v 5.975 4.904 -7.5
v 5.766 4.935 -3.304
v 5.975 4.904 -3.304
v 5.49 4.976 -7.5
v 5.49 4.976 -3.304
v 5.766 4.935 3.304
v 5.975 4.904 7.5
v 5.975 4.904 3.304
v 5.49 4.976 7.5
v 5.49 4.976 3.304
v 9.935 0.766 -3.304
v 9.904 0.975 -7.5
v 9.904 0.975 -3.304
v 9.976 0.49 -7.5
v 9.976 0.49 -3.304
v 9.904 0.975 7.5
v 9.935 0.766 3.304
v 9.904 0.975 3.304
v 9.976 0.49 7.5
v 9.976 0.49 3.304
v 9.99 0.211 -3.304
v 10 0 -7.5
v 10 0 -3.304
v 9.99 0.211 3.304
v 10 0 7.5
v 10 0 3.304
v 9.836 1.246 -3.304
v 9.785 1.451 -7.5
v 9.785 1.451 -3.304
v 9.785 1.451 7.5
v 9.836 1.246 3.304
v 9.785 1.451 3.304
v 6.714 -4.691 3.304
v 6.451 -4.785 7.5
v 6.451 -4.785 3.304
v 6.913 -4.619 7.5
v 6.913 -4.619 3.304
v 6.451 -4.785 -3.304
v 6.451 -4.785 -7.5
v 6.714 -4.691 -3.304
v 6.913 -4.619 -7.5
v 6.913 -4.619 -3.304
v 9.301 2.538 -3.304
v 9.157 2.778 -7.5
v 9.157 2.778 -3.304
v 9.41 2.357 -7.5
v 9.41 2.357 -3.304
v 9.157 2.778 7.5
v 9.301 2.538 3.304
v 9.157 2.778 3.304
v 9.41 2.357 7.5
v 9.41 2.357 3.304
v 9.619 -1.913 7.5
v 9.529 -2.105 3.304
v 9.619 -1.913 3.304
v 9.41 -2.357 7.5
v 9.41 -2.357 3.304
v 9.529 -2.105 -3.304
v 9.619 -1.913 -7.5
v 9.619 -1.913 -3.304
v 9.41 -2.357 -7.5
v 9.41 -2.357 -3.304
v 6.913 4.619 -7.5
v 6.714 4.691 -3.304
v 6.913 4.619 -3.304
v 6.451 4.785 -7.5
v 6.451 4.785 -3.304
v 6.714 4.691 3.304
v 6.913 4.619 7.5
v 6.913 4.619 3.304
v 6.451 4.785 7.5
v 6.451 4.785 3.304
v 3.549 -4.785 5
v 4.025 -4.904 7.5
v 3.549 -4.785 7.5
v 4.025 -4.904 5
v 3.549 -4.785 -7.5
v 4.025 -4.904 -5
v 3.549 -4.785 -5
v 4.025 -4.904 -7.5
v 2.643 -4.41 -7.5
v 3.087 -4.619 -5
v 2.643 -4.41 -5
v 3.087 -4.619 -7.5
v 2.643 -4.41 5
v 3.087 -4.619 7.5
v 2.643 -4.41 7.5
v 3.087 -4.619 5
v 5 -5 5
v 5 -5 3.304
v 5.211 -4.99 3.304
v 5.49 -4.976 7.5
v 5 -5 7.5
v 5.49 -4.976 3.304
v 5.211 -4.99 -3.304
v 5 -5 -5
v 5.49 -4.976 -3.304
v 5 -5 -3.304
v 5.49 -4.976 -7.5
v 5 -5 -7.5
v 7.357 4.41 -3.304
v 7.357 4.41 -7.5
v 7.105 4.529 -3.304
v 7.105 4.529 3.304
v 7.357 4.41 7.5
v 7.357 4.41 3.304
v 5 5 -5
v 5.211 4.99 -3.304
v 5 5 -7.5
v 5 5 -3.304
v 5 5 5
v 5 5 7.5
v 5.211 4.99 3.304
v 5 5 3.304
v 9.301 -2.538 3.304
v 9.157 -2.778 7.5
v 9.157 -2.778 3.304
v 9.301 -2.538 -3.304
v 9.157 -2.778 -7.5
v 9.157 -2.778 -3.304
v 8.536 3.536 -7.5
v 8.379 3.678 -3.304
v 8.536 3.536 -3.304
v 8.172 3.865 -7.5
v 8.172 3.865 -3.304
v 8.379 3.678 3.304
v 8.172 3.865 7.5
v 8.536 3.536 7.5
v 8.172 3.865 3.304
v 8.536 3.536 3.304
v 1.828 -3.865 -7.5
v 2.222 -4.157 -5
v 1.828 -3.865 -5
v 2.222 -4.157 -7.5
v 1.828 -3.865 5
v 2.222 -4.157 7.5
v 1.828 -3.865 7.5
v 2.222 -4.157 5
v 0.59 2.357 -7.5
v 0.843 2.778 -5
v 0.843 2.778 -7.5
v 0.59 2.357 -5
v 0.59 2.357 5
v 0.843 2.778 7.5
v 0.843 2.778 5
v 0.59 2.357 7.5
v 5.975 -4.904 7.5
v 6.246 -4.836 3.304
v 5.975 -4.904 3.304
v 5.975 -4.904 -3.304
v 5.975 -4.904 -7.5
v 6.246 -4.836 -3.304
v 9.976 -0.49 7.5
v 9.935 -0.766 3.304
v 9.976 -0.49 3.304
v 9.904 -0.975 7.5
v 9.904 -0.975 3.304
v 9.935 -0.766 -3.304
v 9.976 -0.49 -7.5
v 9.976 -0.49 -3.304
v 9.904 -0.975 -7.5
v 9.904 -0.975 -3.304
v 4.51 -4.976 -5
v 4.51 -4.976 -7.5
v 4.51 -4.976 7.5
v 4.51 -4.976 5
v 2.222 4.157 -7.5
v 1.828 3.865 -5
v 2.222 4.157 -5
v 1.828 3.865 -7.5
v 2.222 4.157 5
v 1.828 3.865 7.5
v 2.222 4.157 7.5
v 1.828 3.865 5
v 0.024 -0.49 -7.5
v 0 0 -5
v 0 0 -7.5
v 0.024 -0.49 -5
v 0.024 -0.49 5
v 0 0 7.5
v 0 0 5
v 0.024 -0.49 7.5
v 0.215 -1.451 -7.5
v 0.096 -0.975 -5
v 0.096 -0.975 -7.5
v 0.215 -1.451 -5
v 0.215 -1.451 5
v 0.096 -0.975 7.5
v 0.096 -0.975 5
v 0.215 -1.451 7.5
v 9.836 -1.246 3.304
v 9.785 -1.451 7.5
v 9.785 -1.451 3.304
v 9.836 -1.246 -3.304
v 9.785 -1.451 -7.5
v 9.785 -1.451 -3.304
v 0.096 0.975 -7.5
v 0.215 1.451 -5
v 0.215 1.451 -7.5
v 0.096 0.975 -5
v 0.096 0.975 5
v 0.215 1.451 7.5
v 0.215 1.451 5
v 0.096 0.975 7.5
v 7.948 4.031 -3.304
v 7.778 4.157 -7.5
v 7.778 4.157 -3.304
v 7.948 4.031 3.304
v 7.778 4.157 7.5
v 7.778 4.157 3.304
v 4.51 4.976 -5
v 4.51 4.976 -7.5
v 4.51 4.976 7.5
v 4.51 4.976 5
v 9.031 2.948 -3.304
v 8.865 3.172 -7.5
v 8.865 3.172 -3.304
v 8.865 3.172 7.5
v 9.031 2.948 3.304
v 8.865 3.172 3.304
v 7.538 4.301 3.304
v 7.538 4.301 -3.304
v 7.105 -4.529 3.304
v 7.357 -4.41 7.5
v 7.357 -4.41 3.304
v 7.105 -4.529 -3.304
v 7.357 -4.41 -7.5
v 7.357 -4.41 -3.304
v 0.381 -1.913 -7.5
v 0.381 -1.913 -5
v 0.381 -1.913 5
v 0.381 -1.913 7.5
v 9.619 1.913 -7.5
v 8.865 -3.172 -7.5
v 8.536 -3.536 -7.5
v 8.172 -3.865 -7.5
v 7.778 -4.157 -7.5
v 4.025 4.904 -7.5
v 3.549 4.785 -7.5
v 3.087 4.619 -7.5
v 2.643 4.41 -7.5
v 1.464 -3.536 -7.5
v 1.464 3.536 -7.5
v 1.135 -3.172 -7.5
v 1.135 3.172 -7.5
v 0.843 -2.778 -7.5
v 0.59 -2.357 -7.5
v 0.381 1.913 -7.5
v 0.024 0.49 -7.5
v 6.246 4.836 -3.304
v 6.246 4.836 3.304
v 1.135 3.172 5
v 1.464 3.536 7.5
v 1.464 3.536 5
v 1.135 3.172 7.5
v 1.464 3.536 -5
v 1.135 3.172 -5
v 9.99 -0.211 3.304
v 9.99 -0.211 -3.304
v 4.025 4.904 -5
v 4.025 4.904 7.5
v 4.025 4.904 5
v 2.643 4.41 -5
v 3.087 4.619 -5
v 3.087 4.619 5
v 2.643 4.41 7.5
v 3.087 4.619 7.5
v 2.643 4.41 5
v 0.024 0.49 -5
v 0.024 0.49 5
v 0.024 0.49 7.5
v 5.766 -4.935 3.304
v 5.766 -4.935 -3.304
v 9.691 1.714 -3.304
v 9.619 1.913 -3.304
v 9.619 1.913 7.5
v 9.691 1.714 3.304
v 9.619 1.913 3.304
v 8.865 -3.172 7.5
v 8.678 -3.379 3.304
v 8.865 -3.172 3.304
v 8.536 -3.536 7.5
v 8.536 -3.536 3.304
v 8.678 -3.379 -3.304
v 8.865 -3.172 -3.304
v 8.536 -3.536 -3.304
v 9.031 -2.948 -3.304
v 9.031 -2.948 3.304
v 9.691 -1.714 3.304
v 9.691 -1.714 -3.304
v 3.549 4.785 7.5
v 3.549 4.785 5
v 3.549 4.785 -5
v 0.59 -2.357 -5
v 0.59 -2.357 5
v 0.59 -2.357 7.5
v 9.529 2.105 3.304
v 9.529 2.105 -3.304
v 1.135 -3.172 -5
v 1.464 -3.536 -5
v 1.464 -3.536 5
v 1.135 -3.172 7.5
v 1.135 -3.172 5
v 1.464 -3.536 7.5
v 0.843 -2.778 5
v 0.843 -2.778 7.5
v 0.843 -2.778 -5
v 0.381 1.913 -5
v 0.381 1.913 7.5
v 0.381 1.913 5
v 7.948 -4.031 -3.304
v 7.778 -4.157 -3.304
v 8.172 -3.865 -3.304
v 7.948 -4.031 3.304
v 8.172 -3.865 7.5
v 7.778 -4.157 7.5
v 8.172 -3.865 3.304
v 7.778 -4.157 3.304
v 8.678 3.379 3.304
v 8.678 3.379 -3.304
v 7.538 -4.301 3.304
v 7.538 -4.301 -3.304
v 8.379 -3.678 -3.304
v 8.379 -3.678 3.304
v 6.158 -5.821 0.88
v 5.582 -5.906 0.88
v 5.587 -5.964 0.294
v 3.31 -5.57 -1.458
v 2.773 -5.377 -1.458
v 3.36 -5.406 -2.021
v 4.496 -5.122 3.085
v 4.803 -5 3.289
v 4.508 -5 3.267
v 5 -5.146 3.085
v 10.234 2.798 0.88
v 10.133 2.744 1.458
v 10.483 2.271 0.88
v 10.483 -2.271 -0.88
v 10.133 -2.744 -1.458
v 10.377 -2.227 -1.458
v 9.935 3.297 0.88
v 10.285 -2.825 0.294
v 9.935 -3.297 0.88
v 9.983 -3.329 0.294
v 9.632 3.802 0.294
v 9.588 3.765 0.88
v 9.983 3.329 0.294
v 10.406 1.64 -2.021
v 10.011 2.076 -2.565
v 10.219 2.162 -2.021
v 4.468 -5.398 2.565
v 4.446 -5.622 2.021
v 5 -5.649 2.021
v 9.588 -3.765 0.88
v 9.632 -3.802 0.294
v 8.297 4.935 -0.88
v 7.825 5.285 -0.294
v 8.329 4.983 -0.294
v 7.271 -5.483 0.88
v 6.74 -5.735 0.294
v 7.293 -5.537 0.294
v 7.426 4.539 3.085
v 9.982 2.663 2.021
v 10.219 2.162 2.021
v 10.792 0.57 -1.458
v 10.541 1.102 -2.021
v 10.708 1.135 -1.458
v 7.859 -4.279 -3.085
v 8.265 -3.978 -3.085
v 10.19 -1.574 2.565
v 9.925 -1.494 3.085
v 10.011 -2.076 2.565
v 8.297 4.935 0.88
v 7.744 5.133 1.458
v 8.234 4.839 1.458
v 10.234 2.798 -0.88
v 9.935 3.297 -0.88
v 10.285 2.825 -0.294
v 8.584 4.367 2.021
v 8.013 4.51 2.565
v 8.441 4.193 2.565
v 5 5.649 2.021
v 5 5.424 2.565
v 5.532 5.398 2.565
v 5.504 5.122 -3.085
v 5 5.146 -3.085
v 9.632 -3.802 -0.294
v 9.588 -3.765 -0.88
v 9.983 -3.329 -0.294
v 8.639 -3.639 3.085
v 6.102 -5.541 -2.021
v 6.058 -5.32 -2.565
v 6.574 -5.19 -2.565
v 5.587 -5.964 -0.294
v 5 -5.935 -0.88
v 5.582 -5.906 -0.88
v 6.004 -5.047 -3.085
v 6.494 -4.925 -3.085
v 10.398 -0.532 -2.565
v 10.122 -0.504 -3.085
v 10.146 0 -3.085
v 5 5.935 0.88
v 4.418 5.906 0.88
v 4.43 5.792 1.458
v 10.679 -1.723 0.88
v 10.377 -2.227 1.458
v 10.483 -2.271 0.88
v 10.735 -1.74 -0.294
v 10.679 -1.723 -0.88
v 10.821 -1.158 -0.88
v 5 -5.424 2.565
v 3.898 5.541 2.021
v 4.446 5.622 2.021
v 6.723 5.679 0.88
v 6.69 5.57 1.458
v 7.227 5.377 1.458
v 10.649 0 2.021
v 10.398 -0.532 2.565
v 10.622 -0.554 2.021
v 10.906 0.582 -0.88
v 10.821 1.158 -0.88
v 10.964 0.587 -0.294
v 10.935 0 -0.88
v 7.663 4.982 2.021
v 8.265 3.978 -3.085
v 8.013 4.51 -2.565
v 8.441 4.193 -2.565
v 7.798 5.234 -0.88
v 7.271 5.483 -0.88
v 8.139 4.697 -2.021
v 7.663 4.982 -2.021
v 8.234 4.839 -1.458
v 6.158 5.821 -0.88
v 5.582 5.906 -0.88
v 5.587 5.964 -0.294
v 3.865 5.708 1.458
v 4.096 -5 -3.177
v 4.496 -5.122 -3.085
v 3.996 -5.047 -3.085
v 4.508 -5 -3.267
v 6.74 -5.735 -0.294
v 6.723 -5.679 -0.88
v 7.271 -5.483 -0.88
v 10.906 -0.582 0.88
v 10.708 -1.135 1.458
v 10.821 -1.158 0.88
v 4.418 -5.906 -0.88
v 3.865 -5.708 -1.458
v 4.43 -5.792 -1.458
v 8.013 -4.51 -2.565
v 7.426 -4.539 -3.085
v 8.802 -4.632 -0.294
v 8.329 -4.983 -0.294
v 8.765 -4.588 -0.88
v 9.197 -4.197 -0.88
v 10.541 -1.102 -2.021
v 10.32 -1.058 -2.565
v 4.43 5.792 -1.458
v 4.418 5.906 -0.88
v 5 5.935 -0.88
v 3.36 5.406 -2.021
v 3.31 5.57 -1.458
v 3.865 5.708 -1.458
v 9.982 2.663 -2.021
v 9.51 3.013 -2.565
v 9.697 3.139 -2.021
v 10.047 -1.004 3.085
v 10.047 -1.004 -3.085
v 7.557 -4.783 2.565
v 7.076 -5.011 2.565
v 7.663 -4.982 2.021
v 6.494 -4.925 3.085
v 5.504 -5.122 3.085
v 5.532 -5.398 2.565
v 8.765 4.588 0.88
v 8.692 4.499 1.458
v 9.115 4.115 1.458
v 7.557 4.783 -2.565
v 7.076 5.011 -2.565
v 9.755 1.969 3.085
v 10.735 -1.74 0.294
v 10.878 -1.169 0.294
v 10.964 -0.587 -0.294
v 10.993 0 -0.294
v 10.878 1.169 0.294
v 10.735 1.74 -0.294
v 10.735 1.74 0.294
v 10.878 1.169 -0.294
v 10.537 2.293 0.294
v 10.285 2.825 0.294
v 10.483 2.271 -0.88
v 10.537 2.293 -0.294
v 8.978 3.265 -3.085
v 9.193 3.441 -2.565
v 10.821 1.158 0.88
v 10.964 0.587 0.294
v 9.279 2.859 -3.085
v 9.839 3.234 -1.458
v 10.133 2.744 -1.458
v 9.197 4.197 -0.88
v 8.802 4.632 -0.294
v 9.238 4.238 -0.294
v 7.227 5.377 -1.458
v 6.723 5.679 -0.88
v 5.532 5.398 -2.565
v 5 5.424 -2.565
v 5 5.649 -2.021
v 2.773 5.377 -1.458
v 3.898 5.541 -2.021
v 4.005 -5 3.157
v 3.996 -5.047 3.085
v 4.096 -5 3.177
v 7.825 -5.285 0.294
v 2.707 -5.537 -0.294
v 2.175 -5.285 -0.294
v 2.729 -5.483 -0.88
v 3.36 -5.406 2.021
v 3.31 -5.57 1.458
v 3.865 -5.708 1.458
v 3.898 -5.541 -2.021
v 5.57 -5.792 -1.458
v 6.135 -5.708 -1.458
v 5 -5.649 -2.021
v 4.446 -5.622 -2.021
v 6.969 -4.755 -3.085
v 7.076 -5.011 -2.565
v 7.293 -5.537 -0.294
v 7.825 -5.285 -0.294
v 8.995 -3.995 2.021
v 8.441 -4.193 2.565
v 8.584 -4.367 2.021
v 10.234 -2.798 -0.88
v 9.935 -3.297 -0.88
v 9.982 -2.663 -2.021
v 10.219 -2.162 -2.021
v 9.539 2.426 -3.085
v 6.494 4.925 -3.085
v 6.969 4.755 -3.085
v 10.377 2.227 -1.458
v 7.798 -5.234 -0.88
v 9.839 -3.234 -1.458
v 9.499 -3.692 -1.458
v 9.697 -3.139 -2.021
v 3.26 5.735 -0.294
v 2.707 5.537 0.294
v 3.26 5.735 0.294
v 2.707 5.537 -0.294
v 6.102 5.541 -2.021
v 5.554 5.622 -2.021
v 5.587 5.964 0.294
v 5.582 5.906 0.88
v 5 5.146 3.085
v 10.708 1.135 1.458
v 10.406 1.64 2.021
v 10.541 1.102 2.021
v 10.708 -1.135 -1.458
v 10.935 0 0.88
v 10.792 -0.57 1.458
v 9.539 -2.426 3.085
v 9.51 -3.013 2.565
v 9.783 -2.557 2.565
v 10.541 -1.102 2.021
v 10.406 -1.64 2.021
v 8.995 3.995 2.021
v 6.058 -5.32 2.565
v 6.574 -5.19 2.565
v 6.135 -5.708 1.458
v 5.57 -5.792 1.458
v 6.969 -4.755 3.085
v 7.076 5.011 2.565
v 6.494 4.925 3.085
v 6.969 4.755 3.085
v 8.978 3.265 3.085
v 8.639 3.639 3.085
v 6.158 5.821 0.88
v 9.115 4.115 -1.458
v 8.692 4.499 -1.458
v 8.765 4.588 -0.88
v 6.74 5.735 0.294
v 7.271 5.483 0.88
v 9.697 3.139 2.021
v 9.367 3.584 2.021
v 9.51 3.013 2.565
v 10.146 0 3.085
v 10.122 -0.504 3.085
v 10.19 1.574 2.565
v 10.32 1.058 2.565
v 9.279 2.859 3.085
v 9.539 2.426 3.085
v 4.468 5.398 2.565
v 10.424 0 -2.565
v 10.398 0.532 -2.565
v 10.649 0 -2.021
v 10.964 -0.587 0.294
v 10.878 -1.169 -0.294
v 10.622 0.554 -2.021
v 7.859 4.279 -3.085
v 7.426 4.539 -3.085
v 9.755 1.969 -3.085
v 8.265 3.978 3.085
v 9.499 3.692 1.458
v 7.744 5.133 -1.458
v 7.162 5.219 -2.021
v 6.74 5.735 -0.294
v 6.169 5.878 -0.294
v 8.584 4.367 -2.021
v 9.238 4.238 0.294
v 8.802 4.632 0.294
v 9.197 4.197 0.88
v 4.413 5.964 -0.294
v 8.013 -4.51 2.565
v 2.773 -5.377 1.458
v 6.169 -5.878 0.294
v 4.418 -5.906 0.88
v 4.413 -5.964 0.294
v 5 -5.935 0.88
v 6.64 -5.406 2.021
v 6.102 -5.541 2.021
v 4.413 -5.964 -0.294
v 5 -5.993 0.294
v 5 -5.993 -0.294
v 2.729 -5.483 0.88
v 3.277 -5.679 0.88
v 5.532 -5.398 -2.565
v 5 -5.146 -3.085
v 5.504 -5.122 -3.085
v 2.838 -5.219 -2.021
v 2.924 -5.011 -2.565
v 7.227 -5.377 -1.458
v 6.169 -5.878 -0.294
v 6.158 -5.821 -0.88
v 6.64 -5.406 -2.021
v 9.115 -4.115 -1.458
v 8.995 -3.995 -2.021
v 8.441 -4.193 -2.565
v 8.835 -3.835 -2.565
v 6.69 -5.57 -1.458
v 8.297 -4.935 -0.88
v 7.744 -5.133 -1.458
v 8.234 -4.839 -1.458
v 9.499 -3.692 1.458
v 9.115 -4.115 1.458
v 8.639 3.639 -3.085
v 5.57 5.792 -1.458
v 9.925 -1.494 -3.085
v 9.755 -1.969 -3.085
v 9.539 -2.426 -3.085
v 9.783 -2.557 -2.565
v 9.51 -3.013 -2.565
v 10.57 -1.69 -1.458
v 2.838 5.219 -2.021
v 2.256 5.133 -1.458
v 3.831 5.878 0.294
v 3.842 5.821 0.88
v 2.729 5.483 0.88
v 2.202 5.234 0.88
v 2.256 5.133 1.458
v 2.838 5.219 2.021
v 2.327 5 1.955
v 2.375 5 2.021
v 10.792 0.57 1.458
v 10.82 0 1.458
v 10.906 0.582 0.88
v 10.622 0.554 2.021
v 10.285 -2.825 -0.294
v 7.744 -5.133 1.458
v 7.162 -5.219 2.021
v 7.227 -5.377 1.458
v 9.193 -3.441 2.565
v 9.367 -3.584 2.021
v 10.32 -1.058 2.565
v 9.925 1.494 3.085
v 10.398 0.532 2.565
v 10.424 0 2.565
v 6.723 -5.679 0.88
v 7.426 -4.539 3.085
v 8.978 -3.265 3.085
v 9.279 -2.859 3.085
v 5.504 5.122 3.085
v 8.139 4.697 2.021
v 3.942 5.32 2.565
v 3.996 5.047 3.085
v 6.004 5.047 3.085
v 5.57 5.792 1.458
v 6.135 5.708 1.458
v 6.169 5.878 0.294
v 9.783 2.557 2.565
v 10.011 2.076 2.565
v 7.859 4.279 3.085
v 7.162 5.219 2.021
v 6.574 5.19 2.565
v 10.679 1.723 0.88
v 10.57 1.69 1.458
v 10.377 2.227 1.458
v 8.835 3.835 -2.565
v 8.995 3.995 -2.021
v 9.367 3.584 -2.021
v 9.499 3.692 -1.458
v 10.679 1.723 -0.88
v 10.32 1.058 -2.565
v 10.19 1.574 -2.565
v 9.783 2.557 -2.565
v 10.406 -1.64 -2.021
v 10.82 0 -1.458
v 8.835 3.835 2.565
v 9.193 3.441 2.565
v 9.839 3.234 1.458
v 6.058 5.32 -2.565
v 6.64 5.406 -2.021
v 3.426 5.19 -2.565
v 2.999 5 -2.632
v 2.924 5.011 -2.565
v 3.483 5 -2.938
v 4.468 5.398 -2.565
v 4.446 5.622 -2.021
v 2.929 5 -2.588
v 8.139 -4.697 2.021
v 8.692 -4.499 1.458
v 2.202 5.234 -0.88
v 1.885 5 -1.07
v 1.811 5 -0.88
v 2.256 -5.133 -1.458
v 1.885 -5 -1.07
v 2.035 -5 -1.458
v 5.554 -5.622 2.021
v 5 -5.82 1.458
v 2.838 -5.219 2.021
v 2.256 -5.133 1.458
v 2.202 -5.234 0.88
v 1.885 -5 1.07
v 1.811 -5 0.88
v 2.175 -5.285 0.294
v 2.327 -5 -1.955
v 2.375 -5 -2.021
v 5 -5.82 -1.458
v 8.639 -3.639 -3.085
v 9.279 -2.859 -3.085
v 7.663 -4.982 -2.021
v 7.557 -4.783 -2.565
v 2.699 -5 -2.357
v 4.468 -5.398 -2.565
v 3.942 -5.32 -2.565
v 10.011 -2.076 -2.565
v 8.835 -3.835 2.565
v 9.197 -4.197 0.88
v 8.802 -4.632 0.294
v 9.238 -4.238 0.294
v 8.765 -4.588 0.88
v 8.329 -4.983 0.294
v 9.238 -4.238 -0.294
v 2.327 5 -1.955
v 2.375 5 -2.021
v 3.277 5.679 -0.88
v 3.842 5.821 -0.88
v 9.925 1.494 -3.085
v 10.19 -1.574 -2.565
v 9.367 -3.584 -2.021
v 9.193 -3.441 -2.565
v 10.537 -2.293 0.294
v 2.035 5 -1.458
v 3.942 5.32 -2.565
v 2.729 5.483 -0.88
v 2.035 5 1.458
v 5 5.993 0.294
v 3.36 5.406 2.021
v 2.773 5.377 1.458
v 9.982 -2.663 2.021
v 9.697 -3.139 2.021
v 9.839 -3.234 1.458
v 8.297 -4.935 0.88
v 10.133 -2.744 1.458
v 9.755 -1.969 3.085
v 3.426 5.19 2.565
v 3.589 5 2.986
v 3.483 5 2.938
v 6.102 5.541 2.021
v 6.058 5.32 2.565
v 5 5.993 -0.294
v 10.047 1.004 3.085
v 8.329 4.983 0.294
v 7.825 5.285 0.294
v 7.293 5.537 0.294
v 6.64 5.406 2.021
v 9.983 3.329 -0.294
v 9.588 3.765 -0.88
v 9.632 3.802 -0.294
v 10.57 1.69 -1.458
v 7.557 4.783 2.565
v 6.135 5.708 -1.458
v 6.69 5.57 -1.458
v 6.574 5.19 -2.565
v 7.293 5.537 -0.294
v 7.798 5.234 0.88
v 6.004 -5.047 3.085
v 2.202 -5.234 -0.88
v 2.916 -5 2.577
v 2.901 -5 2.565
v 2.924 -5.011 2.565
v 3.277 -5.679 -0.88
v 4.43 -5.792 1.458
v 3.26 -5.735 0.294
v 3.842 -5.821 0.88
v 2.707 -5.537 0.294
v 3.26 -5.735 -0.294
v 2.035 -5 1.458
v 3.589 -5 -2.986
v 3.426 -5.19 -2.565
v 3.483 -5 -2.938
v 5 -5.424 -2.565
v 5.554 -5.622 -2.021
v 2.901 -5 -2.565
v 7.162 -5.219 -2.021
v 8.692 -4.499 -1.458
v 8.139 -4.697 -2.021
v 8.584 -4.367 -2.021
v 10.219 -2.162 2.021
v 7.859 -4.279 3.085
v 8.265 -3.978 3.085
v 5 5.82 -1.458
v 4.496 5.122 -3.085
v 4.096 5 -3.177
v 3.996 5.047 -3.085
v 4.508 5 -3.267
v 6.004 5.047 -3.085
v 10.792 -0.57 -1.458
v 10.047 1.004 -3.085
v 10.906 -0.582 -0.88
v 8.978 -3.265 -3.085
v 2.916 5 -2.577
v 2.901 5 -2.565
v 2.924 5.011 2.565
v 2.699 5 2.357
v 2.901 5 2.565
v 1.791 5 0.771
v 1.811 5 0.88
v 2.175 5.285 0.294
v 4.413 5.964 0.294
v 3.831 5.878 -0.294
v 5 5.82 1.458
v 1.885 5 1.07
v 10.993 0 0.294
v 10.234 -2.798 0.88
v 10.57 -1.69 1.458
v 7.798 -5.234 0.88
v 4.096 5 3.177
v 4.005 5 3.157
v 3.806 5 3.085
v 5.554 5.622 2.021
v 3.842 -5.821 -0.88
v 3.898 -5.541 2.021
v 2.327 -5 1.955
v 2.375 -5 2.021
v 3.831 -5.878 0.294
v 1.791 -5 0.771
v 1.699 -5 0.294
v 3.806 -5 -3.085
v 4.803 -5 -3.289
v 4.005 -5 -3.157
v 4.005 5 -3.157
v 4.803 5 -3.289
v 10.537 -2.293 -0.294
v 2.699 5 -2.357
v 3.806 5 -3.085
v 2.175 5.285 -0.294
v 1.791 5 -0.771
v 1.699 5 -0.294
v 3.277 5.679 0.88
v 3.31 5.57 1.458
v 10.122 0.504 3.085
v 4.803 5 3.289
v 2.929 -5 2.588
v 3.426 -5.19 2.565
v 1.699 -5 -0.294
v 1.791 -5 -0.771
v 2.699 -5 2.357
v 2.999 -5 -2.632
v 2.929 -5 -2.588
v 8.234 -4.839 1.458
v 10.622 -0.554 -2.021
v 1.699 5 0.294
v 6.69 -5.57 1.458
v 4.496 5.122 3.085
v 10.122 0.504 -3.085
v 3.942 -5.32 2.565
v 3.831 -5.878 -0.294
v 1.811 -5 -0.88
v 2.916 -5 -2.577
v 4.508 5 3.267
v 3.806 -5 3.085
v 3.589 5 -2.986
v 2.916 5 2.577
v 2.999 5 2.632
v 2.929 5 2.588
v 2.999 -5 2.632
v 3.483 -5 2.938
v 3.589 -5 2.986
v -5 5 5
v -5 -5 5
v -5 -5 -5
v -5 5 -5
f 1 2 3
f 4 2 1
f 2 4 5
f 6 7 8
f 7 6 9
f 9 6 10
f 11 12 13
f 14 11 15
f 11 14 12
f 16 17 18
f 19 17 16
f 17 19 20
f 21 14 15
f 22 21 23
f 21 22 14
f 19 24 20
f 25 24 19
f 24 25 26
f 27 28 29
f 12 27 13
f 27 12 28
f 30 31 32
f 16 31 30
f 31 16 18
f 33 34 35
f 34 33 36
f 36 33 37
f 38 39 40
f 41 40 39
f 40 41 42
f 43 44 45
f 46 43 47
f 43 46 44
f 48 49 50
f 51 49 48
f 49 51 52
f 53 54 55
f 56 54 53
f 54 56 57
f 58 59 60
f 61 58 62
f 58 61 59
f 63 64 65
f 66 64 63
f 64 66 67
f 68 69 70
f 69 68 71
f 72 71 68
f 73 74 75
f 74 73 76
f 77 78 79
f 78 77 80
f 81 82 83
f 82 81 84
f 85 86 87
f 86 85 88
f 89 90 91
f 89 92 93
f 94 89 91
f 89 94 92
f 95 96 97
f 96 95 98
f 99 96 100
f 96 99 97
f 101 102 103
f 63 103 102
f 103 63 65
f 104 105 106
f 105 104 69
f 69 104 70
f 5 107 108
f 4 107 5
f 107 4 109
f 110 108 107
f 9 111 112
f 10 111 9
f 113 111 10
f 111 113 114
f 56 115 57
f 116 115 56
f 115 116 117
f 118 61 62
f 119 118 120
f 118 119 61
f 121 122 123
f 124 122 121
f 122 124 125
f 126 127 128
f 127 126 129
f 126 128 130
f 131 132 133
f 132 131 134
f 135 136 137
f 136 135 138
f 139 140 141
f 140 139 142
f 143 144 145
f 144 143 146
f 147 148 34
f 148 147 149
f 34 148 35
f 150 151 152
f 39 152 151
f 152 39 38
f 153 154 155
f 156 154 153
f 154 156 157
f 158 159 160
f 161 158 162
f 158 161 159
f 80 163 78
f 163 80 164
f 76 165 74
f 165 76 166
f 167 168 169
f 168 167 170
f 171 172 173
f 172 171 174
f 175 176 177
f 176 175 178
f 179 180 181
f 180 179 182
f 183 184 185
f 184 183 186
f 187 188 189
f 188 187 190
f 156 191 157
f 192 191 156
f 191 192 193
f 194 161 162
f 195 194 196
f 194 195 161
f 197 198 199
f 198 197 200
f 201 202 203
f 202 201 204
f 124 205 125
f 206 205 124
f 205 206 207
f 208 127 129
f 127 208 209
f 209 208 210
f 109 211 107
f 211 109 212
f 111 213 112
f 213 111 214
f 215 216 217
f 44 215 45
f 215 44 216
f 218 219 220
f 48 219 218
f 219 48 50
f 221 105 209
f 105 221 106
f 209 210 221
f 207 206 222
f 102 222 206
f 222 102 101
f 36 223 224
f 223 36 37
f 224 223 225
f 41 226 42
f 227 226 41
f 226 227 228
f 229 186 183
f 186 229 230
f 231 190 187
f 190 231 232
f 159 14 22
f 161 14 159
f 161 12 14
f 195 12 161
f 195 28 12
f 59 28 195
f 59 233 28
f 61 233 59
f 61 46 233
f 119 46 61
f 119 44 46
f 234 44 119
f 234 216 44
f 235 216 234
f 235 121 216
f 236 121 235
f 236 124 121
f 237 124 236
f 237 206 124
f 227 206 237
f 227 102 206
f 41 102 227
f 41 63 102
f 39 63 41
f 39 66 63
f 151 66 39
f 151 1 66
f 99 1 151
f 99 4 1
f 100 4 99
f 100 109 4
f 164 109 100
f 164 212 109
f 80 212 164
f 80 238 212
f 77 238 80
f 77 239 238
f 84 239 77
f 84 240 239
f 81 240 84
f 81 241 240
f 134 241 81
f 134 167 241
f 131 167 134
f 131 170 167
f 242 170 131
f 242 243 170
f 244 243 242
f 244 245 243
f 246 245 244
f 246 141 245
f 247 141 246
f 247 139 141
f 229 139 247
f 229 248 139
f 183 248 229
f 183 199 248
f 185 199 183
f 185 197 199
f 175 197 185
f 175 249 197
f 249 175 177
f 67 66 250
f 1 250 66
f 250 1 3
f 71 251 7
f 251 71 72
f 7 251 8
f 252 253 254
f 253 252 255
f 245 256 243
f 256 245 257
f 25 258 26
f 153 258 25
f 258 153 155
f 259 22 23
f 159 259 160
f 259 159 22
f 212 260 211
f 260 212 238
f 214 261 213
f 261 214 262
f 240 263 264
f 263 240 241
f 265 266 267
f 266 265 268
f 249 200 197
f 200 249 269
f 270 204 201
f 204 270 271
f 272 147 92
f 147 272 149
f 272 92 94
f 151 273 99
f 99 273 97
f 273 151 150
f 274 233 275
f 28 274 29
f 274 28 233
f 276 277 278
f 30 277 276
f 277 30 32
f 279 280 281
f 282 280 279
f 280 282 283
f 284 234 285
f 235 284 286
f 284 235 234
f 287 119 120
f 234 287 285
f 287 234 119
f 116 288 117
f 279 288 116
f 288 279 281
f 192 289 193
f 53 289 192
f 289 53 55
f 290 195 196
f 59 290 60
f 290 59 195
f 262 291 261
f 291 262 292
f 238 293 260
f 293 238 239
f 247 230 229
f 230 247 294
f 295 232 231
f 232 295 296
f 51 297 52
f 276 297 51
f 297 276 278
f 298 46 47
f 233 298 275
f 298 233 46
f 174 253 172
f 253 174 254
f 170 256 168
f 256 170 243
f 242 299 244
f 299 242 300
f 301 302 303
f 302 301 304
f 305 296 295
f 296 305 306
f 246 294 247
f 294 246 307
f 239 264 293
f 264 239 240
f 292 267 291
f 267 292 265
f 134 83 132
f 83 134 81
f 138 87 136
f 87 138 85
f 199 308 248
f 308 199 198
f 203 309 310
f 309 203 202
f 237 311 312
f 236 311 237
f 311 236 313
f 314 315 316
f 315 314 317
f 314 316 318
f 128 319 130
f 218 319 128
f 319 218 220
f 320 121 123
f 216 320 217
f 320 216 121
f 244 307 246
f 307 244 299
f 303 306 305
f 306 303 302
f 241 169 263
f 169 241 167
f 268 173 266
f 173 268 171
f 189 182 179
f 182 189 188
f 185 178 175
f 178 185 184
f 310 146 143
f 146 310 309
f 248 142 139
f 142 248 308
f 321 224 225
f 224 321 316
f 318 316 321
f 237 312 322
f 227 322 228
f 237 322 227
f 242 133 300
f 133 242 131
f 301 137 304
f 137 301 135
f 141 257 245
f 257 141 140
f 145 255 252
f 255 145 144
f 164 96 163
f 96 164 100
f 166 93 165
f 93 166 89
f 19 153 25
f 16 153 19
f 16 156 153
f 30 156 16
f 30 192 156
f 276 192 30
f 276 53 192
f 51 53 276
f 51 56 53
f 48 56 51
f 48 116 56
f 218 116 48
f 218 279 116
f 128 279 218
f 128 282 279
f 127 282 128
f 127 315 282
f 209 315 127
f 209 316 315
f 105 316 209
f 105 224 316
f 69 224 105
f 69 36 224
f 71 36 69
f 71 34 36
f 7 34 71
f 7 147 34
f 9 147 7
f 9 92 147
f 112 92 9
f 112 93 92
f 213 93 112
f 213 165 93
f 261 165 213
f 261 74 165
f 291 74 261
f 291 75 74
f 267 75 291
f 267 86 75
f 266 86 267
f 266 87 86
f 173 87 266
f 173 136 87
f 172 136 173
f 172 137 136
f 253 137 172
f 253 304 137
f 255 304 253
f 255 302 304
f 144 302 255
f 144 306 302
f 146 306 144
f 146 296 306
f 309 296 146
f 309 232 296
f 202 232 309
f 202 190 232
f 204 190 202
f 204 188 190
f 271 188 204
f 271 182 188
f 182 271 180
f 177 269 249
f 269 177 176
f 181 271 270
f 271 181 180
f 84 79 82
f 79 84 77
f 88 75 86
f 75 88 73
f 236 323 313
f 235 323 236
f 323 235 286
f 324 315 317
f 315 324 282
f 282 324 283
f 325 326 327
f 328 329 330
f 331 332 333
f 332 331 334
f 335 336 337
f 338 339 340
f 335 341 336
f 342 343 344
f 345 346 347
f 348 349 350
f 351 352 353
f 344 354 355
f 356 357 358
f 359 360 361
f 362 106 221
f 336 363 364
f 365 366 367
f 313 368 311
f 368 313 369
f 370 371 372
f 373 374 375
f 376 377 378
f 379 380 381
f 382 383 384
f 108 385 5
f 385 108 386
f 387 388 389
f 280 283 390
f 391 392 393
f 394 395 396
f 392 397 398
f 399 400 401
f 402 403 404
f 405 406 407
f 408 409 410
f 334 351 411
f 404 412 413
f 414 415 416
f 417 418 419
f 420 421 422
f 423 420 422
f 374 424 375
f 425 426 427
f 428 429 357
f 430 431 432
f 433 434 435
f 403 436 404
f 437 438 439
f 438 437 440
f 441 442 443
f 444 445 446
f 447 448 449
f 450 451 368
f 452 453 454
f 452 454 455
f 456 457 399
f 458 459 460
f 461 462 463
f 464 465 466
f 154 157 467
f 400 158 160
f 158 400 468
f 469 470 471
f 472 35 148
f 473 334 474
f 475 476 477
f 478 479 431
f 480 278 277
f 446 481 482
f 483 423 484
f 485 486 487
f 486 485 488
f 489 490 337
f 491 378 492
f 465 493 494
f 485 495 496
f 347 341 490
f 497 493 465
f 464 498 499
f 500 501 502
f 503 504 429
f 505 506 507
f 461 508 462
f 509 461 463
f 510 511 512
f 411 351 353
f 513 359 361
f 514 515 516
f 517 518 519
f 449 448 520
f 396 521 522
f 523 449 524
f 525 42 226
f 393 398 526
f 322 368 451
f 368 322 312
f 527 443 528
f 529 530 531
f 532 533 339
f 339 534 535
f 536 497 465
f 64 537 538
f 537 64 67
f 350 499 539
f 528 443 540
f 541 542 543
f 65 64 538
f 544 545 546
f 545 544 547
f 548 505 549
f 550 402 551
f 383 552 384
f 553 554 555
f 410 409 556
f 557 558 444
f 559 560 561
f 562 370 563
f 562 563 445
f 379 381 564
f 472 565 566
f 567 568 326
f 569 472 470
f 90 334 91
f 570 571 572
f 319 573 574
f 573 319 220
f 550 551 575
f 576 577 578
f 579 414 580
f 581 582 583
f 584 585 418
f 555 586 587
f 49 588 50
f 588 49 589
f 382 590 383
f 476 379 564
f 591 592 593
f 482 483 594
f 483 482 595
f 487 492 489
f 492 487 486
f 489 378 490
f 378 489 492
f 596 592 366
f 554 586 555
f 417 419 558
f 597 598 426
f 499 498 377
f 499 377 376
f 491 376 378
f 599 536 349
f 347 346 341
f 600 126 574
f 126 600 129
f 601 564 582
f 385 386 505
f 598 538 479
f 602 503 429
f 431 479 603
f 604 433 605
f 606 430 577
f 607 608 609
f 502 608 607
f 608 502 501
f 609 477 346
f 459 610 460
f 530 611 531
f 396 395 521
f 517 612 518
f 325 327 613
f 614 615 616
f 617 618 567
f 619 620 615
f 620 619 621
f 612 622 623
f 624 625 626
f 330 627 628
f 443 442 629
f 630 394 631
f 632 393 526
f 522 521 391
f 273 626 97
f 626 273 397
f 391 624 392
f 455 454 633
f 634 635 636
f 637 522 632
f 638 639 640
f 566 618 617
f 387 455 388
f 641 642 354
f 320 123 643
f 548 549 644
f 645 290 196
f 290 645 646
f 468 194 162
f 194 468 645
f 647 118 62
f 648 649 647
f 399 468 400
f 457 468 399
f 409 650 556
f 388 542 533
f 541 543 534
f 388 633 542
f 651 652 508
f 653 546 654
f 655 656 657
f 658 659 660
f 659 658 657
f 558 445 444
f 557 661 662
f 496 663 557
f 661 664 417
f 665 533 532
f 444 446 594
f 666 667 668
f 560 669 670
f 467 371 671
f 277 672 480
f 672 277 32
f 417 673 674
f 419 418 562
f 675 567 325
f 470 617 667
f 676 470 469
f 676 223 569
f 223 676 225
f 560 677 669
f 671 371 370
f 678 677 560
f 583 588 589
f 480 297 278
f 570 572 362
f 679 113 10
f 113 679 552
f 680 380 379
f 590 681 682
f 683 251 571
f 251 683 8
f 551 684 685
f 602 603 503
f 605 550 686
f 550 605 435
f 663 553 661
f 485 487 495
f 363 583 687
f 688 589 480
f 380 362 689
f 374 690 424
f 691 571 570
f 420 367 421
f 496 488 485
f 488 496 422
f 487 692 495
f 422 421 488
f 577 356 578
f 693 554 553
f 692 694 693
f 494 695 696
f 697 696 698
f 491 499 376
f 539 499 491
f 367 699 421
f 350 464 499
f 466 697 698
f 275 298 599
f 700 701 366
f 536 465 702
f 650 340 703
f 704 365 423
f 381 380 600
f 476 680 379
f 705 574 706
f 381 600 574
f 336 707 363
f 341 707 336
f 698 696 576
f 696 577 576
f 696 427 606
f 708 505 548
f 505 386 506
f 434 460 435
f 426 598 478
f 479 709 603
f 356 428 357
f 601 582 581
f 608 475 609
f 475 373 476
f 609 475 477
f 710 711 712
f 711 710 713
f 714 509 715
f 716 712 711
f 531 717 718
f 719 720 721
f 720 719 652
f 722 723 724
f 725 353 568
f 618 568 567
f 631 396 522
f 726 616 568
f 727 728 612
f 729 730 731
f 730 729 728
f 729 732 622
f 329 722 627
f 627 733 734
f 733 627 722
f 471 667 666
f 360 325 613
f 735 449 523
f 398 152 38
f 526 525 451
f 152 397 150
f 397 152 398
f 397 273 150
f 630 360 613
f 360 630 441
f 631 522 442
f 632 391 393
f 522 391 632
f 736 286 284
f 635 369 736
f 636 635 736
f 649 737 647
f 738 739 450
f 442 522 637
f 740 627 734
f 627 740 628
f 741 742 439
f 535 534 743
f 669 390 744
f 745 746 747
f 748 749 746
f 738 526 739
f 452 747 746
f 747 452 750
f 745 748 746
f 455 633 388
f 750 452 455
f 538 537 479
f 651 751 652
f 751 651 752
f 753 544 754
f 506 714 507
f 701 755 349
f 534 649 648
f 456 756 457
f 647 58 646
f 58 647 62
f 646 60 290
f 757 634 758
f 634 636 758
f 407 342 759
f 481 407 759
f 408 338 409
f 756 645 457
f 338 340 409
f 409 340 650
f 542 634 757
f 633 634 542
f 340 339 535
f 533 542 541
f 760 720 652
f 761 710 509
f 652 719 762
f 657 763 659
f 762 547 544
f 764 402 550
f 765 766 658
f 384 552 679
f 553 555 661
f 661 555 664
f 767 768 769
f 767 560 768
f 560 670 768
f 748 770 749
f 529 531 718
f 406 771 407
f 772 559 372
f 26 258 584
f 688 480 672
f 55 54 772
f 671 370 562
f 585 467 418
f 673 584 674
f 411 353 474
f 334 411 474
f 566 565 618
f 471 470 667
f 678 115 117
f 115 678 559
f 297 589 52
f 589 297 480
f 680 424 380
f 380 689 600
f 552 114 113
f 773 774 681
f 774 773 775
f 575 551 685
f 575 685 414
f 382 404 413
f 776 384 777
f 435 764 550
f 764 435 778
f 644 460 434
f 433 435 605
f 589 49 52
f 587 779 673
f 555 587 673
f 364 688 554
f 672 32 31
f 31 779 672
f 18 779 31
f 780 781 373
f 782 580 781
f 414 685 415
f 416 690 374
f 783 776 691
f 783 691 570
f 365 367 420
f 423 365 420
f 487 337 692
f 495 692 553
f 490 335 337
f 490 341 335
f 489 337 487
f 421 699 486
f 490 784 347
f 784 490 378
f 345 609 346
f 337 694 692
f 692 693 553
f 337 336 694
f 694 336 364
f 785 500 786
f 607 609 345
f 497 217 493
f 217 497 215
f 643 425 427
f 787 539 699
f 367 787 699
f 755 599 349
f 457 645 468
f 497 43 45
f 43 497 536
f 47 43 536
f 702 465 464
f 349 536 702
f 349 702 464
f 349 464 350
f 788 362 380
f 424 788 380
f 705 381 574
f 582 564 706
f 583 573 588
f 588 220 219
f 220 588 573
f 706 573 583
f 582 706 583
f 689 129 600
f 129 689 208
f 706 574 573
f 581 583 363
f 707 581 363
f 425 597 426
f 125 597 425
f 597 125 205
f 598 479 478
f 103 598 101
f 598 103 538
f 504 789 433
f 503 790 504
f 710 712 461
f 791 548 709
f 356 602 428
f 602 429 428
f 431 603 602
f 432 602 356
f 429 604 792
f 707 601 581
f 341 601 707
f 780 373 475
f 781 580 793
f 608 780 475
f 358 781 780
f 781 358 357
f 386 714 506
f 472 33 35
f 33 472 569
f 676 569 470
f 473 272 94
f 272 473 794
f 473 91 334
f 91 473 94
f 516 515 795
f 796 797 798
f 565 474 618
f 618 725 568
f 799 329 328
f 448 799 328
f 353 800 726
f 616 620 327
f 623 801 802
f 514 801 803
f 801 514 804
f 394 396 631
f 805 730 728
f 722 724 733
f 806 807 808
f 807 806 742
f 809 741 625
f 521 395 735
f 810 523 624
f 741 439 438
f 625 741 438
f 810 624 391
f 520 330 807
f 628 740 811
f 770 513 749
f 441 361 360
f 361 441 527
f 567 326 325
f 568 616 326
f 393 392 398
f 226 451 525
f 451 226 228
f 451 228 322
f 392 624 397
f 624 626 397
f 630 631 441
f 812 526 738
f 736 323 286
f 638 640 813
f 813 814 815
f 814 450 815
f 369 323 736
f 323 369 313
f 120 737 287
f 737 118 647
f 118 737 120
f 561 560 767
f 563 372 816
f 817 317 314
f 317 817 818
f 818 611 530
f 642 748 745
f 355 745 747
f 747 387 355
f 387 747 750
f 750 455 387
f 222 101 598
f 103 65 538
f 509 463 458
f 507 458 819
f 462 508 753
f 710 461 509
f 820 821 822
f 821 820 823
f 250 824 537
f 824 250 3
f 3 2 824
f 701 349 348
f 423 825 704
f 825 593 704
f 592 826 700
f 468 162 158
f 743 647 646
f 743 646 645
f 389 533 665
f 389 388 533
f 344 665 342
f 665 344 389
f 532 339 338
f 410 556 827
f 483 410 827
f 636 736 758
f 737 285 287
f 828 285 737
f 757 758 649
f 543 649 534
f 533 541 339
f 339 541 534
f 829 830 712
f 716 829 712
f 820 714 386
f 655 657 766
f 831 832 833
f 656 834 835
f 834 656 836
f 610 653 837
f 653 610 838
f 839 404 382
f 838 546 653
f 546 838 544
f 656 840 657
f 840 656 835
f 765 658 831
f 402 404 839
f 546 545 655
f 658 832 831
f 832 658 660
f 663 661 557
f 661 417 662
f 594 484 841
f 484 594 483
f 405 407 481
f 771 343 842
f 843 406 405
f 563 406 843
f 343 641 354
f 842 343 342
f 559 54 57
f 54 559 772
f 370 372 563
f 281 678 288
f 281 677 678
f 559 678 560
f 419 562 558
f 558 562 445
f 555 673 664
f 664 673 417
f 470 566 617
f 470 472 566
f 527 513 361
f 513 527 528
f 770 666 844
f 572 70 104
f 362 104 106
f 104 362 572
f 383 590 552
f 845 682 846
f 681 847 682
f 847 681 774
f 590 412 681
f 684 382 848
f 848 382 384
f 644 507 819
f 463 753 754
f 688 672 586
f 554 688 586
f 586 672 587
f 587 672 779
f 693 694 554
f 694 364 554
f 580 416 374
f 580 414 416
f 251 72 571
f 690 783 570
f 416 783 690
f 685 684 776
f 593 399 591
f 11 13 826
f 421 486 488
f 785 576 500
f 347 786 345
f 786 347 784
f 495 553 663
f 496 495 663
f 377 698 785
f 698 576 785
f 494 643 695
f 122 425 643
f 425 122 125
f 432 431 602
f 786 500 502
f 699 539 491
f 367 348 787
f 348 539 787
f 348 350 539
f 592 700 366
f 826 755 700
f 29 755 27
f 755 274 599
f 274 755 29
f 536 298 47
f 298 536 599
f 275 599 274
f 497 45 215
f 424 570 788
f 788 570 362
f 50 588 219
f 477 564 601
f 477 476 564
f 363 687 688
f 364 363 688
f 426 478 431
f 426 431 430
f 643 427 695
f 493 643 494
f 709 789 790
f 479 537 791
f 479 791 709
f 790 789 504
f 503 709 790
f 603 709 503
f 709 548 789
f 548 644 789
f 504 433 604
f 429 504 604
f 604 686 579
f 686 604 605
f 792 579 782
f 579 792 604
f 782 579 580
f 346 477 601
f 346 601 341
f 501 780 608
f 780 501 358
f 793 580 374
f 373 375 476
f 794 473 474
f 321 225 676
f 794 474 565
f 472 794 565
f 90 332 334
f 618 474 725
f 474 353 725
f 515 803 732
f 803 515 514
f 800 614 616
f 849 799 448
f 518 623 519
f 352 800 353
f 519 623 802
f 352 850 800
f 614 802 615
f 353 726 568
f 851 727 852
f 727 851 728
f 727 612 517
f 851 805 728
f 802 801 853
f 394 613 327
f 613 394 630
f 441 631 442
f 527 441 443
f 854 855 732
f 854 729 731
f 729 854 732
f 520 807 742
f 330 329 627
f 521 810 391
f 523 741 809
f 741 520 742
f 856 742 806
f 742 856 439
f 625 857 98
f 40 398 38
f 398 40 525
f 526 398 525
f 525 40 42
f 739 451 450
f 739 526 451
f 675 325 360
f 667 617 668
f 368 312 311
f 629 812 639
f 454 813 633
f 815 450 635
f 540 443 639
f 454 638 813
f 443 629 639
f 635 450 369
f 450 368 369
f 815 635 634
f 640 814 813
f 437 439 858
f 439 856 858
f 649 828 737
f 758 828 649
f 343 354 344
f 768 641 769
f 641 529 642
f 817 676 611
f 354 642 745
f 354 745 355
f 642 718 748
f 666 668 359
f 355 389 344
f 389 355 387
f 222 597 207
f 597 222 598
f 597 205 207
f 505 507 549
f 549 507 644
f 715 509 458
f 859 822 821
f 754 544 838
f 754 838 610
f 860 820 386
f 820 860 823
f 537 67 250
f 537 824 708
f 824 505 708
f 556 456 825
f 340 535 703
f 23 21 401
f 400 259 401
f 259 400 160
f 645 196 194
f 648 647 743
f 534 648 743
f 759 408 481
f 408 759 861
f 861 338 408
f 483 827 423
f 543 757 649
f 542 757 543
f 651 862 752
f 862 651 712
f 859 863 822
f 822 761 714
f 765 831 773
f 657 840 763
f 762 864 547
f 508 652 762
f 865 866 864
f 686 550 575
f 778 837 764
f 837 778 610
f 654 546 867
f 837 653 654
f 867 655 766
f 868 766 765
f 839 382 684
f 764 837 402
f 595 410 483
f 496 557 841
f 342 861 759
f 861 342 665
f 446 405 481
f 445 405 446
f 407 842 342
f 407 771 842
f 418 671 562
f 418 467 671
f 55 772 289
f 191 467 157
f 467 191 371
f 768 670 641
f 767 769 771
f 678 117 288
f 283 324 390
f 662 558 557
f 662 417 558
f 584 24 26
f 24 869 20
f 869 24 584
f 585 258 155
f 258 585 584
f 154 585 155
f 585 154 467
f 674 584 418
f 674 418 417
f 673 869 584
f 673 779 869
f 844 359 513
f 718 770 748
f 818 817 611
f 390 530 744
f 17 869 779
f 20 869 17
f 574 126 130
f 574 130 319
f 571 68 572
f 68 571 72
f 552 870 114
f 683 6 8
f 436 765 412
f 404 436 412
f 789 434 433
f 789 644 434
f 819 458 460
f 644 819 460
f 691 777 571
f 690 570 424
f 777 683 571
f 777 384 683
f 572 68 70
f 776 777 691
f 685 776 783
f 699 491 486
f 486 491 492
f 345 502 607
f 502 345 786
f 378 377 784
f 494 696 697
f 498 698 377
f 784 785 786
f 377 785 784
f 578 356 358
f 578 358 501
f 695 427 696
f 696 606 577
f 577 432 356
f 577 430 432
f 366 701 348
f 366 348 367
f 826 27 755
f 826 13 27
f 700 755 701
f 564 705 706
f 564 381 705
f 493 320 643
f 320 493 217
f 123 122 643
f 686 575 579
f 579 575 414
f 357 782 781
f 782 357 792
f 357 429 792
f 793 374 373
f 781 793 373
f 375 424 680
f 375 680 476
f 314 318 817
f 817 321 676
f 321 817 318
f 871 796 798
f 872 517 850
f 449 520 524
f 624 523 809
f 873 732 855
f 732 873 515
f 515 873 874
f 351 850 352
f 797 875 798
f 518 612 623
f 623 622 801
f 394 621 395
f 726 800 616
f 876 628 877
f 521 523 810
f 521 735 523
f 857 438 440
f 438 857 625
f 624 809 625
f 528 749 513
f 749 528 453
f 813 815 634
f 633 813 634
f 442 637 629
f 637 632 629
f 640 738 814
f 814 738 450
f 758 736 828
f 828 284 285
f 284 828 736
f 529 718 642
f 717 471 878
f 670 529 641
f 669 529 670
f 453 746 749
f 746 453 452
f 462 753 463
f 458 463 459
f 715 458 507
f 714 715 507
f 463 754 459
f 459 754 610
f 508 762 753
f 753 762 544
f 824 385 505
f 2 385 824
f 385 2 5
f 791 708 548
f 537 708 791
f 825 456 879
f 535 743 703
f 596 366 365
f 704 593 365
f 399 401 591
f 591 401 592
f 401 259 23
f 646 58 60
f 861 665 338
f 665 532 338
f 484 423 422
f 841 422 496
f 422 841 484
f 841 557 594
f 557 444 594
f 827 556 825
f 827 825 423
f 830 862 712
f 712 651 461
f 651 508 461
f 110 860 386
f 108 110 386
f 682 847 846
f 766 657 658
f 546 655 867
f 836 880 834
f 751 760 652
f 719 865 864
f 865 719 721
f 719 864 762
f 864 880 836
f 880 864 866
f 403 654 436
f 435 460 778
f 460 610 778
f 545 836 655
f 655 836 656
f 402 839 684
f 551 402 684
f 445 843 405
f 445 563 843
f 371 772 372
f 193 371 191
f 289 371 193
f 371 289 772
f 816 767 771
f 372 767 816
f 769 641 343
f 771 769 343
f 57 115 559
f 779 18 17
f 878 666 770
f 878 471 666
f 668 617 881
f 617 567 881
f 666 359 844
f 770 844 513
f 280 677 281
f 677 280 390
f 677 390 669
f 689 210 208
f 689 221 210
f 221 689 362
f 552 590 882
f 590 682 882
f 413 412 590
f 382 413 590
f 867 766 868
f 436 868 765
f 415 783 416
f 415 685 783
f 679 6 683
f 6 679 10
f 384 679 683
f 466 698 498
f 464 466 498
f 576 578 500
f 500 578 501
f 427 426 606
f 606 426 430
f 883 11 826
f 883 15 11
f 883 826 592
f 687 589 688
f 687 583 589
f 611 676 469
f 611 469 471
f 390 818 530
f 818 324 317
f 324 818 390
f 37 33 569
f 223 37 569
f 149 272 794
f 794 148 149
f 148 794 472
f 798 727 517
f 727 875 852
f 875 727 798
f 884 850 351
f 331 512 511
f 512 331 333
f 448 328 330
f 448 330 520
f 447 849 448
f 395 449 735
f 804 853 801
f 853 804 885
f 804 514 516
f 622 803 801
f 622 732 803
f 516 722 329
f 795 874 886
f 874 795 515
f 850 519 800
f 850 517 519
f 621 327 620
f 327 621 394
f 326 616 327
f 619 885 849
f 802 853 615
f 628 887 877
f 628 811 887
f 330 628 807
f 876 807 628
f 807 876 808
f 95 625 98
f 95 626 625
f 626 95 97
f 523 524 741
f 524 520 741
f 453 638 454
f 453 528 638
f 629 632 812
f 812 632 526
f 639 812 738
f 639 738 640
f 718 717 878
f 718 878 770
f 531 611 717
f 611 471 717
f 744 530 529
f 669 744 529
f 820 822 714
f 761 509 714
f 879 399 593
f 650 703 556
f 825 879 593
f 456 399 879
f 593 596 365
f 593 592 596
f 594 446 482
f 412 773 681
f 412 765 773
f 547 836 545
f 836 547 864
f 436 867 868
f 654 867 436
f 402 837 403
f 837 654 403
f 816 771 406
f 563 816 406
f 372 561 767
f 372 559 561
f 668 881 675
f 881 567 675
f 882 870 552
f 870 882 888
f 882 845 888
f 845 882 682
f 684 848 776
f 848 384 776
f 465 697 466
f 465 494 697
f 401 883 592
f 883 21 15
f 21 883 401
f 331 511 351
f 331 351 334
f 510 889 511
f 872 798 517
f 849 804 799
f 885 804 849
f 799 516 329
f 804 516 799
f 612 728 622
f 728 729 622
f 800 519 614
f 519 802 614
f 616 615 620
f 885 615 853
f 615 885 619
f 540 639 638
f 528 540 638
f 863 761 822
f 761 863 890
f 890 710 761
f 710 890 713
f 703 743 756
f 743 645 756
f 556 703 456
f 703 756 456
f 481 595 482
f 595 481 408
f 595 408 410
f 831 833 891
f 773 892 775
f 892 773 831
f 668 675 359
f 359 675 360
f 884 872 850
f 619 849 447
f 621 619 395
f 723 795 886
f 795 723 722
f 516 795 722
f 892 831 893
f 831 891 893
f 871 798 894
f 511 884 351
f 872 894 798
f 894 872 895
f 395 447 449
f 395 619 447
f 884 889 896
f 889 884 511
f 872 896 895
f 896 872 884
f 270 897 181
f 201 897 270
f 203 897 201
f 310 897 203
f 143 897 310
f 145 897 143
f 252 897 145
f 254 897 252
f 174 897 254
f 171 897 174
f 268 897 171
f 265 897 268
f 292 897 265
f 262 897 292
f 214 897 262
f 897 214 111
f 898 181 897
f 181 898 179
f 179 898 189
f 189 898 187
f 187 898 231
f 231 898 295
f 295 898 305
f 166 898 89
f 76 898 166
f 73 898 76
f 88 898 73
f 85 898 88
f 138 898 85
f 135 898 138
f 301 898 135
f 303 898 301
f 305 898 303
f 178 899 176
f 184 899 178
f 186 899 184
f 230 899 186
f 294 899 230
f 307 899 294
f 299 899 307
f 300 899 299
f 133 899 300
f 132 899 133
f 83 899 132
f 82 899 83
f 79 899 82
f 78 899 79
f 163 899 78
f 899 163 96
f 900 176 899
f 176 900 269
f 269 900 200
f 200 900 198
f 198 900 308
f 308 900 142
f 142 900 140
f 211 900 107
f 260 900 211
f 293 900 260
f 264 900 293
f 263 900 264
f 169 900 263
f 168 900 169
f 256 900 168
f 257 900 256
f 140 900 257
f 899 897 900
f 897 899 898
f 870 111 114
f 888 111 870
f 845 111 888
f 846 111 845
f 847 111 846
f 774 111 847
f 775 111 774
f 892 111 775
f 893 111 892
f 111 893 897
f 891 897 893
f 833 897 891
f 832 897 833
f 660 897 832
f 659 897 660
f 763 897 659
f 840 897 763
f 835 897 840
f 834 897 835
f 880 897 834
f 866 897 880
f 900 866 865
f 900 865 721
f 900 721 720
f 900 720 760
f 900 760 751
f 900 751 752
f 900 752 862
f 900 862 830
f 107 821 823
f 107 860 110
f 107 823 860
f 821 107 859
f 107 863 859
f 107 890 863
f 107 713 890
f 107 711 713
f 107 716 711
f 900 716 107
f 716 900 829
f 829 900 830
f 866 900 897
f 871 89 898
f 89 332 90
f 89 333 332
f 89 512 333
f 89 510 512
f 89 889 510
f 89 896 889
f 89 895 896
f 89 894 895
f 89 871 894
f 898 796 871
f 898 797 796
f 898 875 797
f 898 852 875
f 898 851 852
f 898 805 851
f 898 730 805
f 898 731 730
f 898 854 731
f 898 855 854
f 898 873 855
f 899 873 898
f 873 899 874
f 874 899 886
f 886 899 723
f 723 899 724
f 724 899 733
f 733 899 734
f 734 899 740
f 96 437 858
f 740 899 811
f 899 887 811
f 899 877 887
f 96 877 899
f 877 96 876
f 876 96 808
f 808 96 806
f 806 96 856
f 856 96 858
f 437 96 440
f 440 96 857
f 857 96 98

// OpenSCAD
// Set fragment number for roundings
$fn = $preview ? 32 : 64;

// Size of the Cube (all directions)
cuSize = 10;

// The diameter of the Cylinder
cyDia = 10;

// The height of the Cylinder
cyHei = 15;

// The radius of the Sphere
sphereRadius = 6;

// X-Translation of the Cylinder and Sphere
tX = 5;

// Create Cube and move Cylinder and Sphere by 'tX'
// You need to use {} around the shapes to translate
cube(size = [cuSize, cuSize, cuSize], center = true);
translate([tX, 0, 0]){
    cylinder(d = cyDia, h = cyHei, center = true);
    sphere(r = sphereRadius);
}
